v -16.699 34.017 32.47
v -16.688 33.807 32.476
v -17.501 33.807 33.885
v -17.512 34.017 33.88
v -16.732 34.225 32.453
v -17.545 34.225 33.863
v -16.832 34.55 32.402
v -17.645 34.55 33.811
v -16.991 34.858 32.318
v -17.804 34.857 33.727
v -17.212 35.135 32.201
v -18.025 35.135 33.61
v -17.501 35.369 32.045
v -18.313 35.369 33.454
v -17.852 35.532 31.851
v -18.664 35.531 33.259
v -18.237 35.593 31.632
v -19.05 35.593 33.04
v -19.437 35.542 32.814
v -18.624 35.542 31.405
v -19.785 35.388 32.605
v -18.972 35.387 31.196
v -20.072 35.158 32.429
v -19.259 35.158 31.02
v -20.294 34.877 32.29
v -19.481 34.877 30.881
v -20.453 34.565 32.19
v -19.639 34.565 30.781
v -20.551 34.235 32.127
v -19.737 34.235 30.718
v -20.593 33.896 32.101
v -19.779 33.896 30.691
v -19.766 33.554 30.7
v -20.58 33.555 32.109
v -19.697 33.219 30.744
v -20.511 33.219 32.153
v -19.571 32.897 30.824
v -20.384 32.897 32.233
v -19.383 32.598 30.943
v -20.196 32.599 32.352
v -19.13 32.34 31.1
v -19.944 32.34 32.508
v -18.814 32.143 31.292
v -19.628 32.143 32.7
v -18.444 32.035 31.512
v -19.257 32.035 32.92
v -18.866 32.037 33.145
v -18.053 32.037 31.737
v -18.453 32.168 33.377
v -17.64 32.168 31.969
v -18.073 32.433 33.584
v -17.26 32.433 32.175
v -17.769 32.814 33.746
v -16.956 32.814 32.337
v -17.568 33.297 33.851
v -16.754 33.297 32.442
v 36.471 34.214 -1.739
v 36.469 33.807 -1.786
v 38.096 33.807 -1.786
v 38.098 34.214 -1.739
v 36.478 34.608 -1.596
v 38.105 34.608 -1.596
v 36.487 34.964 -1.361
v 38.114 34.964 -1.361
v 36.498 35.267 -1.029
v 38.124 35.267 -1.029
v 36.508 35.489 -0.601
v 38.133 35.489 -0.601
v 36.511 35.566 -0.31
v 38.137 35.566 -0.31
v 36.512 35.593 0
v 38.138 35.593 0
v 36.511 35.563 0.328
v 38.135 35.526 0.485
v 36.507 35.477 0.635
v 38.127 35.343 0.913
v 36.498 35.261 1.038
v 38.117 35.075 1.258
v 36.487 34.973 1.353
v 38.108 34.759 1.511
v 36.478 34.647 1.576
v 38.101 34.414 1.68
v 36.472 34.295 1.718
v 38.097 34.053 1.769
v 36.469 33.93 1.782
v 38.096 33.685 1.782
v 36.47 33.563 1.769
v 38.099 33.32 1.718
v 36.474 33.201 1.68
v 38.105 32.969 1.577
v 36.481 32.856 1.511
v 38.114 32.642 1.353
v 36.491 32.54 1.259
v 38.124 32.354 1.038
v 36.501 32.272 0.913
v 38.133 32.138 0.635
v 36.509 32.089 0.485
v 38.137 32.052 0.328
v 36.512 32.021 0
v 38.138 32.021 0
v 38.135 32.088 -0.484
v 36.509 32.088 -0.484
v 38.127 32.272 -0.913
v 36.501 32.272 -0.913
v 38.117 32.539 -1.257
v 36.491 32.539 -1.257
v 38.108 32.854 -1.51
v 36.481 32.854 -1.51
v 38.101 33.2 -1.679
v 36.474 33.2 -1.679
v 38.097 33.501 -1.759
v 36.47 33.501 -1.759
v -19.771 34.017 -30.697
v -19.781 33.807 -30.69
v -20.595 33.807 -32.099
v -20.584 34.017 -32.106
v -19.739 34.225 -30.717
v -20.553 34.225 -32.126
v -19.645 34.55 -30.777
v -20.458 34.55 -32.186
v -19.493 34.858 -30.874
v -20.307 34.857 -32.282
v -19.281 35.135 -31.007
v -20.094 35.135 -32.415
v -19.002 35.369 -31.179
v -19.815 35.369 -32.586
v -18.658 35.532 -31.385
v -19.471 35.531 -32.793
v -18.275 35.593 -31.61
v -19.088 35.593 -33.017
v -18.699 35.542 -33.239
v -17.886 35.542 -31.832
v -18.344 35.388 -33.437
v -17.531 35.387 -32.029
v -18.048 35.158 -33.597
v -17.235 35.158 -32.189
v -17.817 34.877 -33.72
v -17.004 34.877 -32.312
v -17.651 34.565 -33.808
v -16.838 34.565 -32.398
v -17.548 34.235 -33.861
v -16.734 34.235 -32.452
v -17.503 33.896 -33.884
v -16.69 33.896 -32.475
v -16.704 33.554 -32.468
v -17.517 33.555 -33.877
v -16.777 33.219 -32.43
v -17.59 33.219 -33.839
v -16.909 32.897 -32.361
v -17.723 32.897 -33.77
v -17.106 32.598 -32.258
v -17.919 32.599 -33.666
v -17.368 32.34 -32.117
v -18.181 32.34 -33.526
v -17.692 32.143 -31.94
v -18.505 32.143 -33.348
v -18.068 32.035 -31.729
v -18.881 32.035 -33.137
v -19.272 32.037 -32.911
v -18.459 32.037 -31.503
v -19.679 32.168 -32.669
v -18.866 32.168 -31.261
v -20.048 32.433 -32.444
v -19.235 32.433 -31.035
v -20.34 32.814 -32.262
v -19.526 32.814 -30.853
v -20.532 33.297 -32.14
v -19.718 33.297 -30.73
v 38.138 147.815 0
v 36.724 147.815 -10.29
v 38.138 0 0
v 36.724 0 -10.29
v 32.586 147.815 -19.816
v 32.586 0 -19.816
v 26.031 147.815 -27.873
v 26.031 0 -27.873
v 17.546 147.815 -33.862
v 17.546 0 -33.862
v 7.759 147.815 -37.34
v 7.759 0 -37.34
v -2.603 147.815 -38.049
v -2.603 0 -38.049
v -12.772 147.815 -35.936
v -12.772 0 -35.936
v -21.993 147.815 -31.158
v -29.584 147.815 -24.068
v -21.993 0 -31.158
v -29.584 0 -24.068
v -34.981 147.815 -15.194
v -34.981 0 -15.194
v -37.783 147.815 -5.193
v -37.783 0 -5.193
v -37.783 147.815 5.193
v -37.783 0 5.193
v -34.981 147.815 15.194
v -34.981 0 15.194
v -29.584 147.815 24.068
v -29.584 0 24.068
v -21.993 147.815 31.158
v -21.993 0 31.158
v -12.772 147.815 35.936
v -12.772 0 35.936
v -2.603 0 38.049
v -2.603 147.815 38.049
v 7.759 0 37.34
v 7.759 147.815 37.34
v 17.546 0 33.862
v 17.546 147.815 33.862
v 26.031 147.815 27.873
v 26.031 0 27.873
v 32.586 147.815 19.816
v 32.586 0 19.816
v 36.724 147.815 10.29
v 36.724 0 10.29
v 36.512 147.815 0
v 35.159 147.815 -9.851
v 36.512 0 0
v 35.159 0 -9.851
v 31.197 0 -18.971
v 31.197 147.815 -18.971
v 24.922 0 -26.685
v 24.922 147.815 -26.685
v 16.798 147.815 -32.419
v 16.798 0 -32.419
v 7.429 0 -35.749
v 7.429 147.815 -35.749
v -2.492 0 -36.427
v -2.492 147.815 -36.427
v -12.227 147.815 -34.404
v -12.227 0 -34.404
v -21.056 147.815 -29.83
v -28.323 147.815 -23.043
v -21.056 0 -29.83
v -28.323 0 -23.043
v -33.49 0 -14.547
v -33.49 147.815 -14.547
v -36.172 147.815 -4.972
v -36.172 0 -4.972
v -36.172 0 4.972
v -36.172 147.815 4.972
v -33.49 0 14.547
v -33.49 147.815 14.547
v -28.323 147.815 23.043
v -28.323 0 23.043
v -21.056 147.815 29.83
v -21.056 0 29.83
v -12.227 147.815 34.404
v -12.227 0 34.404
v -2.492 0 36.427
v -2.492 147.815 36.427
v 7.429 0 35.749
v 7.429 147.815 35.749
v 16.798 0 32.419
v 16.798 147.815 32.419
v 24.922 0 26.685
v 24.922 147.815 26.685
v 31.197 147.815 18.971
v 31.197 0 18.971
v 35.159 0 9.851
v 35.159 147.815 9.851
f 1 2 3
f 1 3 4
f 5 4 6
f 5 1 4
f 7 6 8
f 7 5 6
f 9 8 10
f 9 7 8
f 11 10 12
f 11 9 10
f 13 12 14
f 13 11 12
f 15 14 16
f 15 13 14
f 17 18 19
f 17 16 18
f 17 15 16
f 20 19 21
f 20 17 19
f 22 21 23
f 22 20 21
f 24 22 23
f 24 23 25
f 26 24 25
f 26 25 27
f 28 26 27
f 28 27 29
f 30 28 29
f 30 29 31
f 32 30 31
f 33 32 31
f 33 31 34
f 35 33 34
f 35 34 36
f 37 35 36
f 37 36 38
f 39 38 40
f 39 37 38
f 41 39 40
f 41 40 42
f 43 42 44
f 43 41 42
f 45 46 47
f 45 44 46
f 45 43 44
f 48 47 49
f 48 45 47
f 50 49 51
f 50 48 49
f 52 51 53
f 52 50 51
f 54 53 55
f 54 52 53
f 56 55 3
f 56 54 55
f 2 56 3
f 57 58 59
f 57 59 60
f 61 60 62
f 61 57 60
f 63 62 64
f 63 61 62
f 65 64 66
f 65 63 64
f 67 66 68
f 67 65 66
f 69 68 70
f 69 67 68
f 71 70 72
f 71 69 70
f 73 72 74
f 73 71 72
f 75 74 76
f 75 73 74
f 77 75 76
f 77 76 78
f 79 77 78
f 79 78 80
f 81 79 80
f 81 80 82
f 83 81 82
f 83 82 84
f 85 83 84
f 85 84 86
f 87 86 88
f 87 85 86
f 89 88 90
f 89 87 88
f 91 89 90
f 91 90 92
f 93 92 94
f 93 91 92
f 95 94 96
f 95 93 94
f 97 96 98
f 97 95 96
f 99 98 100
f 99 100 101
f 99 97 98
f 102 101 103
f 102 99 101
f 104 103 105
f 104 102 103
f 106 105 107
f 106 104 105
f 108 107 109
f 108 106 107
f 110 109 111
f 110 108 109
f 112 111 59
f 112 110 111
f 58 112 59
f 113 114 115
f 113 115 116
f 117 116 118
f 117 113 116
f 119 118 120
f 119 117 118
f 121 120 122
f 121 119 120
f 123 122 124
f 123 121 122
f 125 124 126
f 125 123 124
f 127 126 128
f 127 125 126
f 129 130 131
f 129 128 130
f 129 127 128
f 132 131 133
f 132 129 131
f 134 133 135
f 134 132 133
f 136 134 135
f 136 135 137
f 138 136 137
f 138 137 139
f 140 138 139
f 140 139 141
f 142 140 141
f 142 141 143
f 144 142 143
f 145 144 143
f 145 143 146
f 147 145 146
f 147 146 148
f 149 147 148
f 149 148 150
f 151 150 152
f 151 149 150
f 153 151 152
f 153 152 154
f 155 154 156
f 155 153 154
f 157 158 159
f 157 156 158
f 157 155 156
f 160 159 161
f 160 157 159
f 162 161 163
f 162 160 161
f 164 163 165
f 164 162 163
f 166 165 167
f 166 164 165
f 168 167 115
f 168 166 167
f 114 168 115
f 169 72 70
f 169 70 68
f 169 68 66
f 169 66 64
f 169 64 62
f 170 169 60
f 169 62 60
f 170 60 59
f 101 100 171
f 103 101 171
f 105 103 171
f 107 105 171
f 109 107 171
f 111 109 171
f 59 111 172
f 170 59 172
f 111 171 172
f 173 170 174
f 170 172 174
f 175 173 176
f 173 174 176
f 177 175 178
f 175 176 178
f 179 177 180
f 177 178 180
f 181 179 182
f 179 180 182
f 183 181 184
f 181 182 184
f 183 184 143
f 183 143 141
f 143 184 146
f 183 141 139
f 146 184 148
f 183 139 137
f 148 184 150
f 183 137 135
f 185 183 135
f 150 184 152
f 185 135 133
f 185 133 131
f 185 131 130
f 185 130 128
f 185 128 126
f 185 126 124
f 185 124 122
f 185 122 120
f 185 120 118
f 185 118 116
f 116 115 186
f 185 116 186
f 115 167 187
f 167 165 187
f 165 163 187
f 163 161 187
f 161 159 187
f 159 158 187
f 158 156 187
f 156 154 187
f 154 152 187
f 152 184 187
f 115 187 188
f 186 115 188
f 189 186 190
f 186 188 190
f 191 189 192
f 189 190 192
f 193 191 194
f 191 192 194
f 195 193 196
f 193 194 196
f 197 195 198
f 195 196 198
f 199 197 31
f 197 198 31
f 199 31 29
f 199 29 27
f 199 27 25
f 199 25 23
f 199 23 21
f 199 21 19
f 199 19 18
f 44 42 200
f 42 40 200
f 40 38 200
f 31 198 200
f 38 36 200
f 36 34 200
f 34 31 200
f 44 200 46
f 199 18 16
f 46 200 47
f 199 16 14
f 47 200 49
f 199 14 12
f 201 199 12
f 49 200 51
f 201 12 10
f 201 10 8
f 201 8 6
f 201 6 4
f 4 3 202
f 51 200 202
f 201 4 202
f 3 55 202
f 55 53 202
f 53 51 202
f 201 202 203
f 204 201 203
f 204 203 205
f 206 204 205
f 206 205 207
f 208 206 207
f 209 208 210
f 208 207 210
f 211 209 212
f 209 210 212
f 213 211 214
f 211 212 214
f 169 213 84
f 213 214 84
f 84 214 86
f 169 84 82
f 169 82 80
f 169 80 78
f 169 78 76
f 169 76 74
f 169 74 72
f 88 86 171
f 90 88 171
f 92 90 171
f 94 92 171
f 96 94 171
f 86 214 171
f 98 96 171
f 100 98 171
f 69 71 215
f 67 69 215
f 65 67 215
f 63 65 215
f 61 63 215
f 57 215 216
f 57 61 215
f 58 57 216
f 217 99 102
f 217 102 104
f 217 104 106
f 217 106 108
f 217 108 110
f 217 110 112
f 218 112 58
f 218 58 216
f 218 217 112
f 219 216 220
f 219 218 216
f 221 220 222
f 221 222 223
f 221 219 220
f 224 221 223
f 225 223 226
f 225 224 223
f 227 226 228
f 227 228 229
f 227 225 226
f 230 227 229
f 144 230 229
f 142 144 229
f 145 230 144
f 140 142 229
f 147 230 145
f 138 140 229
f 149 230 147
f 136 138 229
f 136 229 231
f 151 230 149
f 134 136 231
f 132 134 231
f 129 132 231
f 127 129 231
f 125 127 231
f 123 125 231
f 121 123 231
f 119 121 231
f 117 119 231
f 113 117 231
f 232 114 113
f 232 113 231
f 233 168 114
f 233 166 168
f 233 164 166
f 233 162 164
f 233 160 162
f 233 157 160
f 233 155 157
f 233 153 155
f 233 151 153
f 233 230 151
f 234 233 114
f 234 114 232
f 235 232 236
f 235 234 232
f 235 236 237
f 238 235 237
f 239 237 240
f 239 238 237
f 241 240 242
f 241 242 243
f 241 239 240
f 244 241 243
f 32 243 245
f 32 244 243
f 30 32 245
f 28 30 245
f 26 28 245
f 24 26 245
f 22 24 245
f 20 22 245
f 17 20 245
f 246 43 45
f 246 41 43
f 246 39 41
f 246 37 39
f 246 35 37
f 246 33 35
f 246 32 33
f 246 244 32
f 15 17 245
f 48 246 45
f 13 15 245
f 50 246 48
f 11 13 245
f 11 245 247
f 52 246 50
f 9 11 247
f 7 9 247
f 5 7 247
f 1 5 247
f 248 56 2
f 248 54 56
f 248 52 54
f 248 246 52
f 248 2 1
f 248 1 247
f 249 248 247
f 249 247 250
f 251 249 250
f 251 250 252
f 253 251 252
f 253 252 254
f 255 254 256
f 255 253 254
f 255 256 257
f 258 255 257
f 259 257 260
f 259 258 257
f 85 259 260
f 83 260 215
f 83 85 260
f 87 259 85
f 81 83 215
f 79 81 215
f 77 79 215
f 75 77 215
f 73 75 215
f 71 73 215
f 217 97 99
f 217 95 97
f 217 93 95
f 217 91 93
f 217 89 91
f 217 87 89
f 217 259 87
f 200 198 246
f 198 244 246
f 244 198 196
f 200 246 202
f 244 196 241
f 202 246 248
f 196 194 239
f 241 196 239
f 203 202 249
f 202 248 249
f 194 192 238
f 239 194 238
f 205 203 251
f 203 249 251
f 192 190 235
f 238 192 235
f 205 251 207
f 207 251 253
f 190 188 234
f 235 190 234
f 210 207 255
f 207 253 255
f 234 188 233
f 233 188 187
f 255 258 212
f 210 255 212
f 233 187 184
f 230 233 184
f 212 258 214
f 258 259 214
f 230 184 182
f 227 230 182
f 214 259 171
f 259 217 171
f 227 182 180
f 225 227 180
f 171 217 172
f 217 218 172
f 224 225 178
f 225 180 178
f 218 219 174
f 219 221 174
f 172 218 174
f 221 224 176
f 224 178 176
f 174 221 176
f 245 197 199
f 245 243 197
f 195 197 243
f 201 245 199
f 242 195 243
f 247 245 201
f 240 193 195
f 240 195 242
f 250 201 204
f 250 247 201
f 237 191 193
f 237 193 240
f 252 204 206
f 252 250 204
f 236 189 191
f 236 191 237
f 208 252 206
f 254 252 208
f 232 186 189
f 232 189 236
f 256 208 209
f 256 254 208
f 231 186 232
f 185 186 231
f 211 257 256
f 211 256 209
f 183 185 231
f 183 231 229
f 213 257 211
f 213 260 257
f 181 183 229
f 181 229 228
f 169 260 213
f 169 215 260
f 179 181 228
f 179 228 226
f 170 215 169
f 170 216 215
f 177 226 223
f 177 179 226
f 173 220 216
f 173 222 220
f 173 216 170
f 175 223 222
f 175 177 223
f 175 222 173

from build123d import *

# Parameters (mm, degrees)
SKETCH1_R           = 38.1381
SKETCH1_R_2         = 36.5125
BOSS_EXTRUDE1_DEPTH = 147.8153
CUT_EXTRUDE1_START  = -1.669304
SKETCH2_R           = 1.7859375
CUT_EXTRUDE1_DEPTH  = 1.669304
CIRPATTERN1_COUNT   = 3


with BuildPart() as part:
    # Sketch1 → Boss-Extrude1 (new body)
    with BuildSketch(Plane(origin=(0, 0, 0), x_dir=(1, 0, 0), z_dir=(0, 1, 0))):
        Circle(SKETCH1_R)
        Circle(SKETCH1_R_2, mode=Mode.SUBTRACT)
    extrude(amount=BOSS_EXTRUDE1_DEPTH)

    # Sketch2 → Cut-Extrude1 (cut)
    with BuildSketch(Plane(origin=(38.1381, 0, 0), x_dir=(0, 0, -1), z_dir=(1, 0, 0)).offset(CUT_EXTRUDE1_START)):
        with Locations((0, 33.8074)):
            Circle(SKETCH2_R)
    cut_extrude1 = extrude(amount=CUT_EXTRUDE1_DEPTH, mode=Mode.SUBTRACT)

    # CirPattern1: Cut-Extrude1 ×3 about axis
    cirpattern1_axis = Axis((0, 155.08605, 0), (0, -1, 0))
    for i in range(1, CIRPATTERN1_COUNT):
        add(cut_extrude1.rotate(cirpattern1_axis, i * 360 / CIRPATTERN1_COUNT), mode=Mode.SUBTRACT)


solid = part.part
